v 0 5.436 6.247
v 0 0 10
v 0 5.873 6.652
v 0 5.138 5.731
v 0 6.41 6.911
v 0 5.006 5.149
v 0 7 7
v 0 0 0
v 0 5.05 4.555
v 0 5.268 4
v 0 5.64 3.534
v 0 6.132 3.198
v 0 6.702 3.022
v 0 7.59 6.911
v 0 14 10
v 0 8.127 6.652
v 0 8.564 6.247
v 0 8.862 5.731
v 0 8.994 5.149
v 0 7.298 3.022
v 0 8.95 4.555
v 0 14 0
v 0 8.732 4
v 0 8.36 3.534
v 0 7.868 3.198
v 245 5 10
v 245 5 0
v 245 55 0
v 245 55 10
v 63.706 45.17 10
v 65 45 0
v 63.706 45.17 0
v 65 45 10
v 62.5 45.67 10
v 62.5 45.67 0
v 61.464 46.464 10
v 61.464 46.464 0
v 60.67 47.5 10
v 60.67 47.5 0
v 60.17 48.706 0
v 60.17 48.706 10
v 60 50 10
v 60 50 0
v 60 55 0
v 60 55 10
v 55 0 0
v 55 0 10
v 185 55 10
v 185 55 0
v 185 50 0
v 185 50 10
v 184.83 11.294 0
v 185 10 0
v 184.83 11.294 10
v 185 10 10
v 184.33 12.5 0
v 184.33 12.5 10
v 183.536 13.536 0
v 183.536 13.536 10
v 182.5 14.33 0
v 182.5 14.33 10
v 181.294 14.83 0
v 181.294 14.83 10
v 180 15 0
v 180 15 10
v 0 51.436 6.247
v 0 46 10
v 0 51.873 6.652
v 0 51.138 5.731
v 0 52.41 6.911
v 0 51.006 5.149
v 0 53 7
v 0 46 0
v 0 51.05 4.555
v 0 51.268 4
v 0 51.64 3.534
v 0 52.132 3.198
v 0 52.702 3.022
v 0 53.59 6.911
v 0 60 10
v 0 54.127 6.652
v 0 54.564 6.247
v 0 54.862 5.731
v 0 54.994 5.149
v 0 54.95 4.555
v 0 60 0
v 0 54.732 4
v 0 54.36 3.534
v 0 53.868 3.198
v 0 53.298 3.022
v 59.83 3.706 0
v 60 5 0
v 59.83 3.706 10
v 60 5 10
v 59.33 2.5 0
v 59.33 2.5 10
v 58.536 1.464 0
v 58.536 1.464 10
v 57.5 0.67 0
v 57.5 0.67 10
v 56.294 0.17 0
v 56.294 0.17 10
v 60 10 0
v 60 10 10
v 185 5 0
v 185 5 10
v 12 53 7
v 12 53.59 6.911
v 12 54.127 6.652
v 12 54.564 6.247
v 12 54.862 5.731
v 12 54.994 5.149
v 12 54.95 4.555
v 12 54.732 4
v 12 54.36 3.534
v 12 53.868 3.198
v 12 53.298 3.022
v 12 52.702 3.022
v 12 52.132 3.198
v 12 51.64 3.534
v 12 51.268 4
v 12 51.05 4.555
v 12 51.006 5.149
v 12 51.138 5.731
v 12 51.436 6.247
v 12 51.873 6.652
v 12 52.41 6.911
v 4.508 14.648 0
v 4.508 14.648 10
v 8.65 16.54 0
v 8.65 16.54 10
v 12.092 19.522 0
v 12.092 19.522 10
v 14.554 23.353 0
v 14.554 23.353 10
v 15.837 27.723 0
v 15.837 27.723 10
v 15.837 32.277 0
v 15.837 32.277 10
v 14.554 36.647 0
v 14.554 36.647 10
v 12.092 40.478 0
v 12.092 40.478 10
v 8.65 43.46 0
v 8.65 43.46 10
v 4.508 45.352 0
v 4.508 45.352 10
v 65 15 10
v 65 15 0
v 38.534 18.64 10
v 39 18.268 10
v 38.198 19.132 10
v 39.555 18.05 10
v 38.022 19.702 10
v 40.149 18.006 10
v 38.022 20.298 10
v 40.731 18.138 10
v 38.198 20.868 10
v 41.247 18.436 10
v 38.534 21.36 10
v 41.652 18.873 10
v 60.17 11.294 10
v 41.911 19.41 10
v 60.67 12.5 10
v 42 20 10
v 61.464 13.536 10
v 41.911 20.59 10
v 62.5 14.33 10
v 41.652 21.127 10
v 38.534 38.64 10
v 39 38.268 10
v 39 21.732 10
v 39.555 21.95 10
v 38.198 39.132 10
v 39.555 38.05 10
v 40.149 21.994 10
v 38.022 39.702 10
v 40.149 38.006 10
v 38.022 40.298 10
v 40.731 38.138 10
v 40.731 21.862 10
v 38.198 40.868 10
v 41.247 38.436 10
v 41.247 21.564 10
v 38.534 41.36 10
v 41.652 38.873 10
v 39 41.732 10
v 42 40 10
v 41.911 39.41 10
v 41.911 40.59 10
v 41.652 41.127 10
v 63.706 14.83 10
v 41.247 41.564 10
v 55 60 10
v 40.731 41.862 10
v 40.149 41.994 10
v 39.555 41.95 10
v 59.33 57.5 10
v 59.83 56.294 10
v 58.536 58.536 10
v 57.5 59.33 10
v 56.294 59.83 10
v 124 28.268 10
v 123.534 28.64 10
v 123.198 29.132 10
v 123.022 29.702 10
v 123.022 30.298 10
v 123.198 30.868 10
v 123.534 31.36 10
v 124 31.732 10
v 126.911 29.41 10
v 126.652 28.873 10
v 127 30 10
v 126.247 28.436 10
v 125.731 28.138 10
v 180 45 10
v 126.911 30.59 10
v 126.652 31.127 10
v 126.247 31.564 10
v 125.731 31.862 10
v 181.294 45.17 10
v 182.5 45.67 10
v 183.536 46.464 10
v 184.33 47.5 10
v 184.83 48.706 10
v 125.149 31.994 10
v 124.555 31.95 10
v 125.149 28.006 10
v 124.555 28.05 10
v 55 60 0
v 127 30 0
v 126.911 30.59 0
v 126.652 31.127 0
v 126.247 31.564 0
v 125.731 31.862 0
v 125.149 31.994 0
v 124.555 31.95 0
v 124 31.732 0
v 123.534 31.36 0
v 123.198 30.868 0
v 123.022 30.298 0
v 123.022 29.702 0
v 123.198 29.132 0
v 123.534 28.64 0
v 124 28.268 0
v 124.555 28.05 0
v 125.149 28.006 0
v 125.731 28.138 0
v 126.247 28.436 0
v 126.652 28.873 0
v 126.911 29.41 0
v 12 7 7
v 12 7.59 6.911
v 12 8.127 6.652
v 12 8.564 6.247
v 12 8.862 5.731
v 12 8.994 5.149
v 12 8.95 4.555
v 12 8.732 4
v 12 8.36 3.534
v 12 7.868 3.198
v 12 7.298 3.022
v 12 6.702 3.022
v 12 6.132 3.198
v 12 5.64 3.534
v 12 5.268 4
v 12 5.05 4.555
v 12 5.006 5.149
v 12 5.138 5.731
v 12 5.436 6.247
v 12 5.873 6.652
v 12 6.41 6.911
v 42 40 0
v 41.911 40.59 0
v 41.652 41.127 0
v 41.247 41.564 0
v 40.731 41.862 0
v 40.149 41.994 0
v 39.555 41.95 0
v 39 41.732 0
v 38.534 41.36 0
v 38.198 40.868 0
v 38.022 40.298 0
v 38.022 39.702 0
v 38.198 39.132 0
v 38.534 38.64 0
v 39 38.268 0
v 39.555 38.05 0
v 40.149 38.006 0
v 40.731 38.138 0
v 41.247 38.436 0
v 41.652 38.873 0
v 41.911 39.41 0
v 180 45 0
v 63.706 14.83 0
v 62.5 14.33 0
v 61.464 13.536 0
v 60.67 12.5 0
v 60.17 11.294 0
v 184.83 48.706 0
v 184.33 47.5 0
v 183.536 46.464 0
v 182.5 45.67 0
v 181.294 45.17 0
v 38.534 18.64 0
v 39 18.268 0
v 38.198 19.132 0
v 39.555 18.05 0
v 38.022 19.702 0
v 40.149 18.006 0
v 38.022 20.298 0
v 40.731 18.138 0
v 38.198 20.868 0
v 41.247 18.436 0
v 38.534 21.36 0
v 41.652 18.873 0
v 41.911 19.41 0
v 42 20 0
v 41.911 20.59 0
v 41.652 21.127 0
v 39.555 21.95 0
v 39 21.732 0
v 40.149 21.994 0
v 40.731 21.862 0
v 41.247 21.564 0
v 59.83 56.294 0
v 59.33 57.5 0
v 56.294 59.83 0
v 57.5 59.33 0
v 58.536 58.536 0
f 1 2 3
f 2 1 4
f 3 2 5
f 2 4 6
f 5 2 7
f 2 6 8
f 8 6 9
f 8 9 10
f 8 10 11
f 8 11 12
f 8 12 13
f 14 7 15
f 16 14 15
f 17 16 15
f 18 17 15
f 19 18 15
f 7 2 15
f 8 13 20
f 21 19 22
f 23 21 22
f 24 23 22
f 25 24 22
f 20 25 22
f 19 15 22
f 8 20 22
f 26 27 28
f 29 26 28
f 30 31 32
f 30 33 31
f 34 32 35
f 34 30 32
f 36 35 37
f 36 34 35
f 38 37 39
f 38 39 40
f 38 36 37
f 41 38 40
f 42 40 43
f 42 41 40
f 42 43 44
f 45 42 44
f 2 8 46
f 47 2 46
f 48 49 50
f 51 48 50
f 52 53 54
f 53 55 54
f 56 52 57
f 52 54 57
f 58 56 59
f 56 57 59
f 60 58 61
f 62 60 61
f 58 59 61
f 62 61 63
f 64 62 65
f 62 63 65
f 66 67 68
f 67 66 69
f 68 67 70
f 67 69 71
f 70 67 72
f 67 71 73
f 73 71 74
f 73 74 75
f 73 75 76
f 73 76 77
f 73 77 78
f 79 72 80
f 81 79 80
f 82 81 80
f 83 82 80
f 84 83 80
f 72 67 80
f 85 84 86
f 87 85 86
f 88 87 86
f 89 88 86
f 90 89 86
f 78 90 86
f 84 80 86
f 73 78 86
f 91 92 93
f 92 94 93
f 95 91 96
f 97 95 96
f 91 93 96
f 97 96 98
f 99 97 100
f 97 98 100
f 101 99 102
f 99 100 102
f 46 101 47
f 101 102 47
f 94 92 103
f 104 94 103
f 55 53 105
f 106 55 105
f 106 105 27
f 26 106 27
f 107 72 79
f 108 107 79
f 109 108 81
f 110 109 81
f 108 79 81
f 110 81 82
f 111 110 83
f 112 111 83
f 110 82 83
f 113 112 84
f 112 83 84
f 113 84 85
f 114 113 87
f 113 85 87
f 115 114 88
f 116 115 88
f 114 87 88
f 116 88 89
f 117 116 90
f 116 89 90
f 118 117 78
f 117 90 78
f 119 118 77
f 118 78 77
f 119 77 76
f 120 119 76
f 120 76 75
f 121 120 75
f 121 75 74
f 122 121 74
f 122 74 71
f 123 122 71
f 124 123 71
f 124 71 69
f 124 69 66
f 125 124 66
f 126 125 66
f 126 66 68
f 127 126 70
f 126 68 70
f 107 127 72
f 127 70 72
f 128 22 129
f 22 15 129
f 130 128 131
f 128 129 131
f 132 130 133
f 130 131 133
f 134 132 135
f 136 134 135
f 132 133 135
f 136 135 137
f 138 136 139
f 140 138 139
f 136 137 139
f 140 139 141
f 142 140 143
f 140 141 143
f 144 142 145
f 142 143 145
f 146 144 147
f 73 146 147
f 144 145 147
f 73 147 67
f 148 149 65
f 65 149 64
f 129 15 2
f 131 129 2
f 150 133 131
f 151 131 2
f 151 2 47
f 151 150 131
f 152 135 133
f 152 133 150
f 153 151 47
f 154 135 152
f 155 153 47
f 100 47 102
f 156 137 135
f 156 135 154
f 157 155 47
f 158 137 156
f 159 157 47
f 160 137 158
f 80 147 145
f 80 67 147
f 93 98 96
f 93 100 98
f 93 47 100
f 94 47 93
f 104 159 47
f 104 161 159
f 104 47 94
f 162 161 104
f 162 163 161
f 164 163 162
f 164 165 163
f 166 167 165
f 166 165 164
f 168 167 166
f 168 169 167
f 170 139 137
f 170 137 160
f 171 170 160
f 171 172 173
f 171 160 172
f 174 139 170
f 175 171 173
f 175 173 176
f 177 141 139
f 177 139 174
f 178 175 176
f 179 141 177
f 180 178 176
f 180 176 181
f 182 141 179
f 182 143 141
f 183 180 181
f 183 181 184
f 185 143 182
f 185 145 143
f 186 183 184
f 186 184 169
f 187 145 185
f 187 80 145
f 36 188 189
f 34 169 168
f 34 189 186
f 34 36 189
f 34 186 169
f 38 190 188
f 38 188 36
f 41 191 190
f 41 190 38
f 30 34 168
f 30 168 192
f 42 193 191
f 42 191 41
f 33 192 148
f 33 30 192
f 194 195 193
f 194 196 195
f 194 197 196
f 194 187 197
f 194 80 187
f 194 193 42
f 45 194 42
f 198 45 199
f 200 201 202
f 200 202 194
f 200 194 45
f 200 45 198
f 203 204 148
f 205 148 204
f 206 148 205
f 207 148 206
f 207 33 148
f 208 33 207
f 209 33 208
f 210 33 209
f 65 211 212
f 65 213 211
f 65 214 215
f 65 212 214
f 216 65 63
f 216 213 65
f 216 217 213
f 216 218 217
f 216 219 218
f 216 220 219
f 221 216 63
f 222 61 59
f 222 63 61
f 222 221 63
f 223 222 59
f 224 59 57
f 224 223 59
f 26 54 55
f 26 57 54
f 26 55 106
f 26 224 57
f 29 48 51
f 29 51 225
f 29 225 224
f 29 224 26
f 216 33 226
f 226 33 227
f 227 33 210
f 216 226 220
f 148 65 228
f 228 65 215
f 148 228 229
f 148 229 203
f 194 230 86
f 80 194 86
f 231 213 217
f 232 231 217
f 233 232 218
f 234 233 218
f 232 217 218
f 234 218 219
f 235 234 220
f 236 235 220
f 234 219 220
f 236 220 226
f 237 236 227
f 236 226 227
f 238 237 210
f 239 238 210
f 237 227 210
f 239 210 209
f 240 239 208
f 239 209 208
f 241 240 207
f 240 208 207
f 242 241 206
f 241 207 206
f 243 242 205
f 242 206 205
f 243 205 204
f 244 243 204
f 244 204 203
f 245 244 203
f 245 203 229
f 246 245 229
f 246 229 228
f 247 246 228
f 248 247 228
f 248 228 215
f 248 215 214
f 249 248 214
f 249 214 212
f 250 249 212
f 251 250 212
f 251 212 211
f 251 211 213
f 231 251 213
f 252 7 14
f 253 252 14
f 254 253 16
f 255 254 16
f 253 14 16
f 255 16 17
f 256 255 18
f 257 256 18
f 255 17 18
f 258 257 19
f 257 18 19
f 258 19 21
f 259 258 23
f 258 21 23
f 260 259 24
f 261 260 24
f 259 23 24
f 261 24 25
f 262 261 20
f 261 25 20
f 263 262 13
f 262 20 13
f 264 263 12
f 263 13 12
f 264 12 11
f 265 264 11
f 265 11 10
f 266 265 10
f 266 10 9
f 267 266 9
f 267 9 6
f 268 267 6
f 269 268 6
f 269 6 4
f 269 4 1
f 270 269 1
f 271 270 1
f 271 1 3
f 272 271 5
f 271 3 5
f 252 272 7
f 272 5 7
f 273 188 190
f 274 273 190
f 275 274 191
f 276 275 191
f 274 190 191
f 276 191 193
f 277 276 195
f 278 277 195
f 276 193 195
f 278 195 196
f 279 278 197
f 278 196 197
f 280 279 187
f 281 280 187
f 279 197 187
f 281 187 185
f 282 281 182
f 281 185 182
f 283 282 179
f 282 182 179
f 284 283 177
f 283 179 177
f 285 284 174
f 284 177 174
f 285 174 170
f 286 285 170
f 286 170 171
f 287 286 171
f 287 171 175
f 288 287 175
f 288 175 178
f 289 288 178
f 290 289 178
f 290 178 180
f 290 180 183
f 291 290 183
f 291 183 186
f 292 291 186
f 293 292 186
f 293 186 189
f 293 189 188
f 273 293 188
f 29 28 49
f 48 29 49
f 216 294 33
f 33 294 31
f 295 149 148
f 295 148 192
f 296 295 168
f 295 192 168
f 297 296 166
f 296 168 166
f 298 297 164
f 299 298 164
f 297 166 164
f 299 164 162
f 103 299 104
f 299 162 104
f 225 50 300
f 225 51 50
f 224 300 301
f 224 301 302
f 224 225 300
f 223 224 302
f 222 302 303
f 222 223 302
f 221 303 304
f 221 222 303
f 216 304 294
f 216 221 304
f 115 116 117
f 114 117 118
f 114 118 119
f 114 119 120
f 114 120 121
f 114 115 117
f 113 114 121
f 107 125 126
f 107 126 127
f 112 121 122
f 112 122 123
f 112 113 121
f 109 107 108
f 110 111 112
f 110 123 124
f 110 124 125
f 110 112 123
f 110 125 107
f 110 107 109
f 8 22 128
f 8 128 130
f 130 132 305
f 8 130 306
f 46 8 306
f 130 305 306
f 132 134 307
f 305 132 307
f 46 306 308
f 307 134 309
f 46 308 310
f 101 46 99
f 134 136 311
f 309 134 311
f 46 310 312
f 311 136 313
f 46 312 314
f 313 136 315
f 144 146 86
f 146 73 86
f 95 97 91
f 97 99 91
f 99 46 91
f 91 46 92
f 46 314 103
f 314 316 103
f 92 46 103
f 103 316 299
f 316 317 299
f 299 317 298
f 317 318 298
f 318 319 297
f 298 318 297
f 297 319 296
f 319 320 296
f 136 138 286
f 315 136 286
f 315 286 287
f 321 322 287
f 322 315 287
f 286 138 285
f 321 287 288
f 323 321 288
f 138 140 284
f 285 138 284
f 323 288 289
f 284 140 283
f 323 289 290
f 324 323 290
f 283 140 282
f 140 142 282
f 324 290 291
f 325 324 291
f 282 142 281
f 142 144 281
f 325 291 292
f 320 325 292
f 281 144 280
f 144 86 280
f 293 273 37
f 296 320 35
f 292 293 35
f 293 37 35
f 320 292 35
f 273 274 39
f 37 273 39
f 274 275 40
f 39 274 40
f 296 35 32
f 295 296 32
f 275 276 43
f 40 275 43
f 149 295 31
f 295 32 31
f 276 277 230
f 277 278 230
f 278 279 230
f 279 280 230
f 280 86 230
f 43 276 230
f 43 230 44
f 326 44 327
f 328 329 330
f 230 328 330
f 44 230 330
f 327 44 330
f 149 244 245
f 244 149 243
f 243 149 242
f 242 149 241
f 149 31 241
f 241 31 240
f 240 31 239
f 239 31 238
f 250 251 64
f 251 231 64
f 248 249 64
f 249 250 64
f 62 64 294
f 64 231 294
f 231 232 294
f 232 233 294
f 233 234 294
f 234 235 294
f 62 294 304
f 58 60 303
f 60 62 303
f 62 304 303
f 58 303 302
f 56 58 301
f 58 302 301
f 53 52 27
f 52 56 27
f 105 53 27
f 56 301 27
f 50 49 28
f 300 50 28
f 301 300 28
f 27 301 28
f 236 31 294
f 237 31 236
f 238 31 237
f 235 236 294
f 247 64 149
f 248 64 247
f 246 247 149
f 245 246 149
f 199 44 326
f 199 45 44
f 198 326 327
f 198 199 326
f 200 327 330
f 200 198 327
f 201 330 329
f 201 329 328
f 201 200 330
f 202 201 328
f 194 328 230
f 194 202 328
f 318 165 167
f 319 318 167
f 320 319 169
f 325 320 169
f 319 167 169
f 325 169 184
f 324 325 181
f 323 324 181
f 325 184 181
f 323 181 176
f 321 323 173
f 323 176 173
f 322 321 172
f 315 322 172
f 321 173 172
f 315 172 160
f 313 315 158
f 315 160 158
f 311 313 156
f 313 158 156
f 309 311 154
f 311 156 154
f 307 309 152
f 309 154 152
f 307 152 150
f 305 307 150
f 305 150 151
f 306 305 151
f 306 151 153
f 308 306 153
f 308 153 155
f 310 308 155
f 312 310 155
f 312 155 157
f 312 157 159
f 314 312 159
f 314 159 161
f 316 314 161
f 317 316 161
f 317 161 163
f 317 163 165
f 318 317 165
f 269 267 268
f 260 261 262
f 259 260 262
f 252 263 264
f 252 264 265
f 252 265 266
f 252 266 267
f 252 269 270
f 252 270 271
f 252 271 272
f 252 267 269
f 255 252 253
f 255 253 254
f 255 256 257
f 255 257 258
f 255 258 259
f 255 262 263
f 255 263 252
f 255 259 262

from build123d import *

# Parameters (mm, degrees)
BOSS_EXTRUDE1_DEPTH = 10
SKETCH2_R           = 2
SKETCH2_R_2         = 16
CUT_EXTRUDE1_DEPTH  = 11
FILLET1_R           = 5
SKETCH3_R           = 2
CUT_EXTRUDE2_DEPTH  = 11
SKETCH4_W           = 10
SKETCH4_H           = 60
CUT_EXTRUDE3_DEPTH  = 246
SKETCH5_R           = 2
CUT_EXTRUDE4_DEPTH  = 12


with BuildPart() as part:
    # Sketch1 → Boss-Extrude1 (new body)
    with BuildSketch(Plane.XY):
        Polygon((245, 5), (245, 55), (185, 55), (185, 45), (60, 45), (60, 60), (-60, 60), (-60, 45), (-185, 45), (-185, 55), (-245, 55), (-245, 5), (-185, 5), (-185, 15), (-60, 15), (-60, 0), (60, 0), (60, 15), (185, 15), (185, 5), align=None)
    extrude(amount=BOSS_EXTRUDE1_DEPTH)

    # Sketch2 → Cut-Extrude1 (cut, through all)
    with BuildSketch(Plane.XY.offset(10)):
        with Locations((40, 20)):
            Circle(SKETCH2_R)
        with Locations((40, 40)):
            Circle(SKETCH2_R)
        with Locations((-40, 40)):
            Circle(SKETCH2_R)
        with Locations((-40, 20)):
            Circle(SKETCH2_R)
        with Locations((0, 30)):
            Circle(SKETCH2_R_2)
    extrude(amount=-CUT_EXTRUDE1_DEPTH, mode=Mode.SUBTRACT)

    # Fillet1
    fillet1_edges = [part.edges().sort_by_distance(p)[0] for p in [
        (185, 15, 5),
        (60, 15, 5),
        (60, 0, 5),
        (-60, 0, 5),
        (-60, 15, 5),
        (-185, 15, 5),
        (-185, 45, 5),
        (-60, 45, 5),
        (-60, 60, 5),
        (60, 60, 5),
        (60, 45, 5),
        (185, 45, 5),
    ]]
    fillet(fillet1_edges, radius=FILLET1_R)

    # Sketch3 → Cut-Extrude2 (cut, through all)
    with BuildSketch(Plane.XY.offset(10)):
        with Locations((-125, 30)):
            Circle(SKETCH3_R)
        with Locations((125, 30)):
            Circle(SKETCH3_R)
    extrude(amount=-CUT_EXTRUDE2_DEPTH, mode=Mode.SUBTRACT)

    # Sketch4 → Cut-Extrude3 (cut, through all)
    with BuildSketch(Plane(origin=(0, 0, 0), x_dir=(0, 0, -1), z_dir=(1, 0, 0))):
        with Locations((-5, 30)):
            Rectangle(SKETCH4_W, SKETCH4_H)
    extrude(amount=-CUT_EXTRUDE3_DEPTH, mode=Mode.SUBTRACT)

    # Sketch5 → Cut-Extrude4 (cut)
    with BuildSketch(Plane.ZY):
        with Locations((5, 53)):
            Circle(SKETCH5_R)
        with Locations((5, 7)):
            Circle(SKETCH5_R)
    extrude(amount=-CUT_EXTRUDE4_DEPTH, mode=Mode.SUBTRACT)


solid = part.part
